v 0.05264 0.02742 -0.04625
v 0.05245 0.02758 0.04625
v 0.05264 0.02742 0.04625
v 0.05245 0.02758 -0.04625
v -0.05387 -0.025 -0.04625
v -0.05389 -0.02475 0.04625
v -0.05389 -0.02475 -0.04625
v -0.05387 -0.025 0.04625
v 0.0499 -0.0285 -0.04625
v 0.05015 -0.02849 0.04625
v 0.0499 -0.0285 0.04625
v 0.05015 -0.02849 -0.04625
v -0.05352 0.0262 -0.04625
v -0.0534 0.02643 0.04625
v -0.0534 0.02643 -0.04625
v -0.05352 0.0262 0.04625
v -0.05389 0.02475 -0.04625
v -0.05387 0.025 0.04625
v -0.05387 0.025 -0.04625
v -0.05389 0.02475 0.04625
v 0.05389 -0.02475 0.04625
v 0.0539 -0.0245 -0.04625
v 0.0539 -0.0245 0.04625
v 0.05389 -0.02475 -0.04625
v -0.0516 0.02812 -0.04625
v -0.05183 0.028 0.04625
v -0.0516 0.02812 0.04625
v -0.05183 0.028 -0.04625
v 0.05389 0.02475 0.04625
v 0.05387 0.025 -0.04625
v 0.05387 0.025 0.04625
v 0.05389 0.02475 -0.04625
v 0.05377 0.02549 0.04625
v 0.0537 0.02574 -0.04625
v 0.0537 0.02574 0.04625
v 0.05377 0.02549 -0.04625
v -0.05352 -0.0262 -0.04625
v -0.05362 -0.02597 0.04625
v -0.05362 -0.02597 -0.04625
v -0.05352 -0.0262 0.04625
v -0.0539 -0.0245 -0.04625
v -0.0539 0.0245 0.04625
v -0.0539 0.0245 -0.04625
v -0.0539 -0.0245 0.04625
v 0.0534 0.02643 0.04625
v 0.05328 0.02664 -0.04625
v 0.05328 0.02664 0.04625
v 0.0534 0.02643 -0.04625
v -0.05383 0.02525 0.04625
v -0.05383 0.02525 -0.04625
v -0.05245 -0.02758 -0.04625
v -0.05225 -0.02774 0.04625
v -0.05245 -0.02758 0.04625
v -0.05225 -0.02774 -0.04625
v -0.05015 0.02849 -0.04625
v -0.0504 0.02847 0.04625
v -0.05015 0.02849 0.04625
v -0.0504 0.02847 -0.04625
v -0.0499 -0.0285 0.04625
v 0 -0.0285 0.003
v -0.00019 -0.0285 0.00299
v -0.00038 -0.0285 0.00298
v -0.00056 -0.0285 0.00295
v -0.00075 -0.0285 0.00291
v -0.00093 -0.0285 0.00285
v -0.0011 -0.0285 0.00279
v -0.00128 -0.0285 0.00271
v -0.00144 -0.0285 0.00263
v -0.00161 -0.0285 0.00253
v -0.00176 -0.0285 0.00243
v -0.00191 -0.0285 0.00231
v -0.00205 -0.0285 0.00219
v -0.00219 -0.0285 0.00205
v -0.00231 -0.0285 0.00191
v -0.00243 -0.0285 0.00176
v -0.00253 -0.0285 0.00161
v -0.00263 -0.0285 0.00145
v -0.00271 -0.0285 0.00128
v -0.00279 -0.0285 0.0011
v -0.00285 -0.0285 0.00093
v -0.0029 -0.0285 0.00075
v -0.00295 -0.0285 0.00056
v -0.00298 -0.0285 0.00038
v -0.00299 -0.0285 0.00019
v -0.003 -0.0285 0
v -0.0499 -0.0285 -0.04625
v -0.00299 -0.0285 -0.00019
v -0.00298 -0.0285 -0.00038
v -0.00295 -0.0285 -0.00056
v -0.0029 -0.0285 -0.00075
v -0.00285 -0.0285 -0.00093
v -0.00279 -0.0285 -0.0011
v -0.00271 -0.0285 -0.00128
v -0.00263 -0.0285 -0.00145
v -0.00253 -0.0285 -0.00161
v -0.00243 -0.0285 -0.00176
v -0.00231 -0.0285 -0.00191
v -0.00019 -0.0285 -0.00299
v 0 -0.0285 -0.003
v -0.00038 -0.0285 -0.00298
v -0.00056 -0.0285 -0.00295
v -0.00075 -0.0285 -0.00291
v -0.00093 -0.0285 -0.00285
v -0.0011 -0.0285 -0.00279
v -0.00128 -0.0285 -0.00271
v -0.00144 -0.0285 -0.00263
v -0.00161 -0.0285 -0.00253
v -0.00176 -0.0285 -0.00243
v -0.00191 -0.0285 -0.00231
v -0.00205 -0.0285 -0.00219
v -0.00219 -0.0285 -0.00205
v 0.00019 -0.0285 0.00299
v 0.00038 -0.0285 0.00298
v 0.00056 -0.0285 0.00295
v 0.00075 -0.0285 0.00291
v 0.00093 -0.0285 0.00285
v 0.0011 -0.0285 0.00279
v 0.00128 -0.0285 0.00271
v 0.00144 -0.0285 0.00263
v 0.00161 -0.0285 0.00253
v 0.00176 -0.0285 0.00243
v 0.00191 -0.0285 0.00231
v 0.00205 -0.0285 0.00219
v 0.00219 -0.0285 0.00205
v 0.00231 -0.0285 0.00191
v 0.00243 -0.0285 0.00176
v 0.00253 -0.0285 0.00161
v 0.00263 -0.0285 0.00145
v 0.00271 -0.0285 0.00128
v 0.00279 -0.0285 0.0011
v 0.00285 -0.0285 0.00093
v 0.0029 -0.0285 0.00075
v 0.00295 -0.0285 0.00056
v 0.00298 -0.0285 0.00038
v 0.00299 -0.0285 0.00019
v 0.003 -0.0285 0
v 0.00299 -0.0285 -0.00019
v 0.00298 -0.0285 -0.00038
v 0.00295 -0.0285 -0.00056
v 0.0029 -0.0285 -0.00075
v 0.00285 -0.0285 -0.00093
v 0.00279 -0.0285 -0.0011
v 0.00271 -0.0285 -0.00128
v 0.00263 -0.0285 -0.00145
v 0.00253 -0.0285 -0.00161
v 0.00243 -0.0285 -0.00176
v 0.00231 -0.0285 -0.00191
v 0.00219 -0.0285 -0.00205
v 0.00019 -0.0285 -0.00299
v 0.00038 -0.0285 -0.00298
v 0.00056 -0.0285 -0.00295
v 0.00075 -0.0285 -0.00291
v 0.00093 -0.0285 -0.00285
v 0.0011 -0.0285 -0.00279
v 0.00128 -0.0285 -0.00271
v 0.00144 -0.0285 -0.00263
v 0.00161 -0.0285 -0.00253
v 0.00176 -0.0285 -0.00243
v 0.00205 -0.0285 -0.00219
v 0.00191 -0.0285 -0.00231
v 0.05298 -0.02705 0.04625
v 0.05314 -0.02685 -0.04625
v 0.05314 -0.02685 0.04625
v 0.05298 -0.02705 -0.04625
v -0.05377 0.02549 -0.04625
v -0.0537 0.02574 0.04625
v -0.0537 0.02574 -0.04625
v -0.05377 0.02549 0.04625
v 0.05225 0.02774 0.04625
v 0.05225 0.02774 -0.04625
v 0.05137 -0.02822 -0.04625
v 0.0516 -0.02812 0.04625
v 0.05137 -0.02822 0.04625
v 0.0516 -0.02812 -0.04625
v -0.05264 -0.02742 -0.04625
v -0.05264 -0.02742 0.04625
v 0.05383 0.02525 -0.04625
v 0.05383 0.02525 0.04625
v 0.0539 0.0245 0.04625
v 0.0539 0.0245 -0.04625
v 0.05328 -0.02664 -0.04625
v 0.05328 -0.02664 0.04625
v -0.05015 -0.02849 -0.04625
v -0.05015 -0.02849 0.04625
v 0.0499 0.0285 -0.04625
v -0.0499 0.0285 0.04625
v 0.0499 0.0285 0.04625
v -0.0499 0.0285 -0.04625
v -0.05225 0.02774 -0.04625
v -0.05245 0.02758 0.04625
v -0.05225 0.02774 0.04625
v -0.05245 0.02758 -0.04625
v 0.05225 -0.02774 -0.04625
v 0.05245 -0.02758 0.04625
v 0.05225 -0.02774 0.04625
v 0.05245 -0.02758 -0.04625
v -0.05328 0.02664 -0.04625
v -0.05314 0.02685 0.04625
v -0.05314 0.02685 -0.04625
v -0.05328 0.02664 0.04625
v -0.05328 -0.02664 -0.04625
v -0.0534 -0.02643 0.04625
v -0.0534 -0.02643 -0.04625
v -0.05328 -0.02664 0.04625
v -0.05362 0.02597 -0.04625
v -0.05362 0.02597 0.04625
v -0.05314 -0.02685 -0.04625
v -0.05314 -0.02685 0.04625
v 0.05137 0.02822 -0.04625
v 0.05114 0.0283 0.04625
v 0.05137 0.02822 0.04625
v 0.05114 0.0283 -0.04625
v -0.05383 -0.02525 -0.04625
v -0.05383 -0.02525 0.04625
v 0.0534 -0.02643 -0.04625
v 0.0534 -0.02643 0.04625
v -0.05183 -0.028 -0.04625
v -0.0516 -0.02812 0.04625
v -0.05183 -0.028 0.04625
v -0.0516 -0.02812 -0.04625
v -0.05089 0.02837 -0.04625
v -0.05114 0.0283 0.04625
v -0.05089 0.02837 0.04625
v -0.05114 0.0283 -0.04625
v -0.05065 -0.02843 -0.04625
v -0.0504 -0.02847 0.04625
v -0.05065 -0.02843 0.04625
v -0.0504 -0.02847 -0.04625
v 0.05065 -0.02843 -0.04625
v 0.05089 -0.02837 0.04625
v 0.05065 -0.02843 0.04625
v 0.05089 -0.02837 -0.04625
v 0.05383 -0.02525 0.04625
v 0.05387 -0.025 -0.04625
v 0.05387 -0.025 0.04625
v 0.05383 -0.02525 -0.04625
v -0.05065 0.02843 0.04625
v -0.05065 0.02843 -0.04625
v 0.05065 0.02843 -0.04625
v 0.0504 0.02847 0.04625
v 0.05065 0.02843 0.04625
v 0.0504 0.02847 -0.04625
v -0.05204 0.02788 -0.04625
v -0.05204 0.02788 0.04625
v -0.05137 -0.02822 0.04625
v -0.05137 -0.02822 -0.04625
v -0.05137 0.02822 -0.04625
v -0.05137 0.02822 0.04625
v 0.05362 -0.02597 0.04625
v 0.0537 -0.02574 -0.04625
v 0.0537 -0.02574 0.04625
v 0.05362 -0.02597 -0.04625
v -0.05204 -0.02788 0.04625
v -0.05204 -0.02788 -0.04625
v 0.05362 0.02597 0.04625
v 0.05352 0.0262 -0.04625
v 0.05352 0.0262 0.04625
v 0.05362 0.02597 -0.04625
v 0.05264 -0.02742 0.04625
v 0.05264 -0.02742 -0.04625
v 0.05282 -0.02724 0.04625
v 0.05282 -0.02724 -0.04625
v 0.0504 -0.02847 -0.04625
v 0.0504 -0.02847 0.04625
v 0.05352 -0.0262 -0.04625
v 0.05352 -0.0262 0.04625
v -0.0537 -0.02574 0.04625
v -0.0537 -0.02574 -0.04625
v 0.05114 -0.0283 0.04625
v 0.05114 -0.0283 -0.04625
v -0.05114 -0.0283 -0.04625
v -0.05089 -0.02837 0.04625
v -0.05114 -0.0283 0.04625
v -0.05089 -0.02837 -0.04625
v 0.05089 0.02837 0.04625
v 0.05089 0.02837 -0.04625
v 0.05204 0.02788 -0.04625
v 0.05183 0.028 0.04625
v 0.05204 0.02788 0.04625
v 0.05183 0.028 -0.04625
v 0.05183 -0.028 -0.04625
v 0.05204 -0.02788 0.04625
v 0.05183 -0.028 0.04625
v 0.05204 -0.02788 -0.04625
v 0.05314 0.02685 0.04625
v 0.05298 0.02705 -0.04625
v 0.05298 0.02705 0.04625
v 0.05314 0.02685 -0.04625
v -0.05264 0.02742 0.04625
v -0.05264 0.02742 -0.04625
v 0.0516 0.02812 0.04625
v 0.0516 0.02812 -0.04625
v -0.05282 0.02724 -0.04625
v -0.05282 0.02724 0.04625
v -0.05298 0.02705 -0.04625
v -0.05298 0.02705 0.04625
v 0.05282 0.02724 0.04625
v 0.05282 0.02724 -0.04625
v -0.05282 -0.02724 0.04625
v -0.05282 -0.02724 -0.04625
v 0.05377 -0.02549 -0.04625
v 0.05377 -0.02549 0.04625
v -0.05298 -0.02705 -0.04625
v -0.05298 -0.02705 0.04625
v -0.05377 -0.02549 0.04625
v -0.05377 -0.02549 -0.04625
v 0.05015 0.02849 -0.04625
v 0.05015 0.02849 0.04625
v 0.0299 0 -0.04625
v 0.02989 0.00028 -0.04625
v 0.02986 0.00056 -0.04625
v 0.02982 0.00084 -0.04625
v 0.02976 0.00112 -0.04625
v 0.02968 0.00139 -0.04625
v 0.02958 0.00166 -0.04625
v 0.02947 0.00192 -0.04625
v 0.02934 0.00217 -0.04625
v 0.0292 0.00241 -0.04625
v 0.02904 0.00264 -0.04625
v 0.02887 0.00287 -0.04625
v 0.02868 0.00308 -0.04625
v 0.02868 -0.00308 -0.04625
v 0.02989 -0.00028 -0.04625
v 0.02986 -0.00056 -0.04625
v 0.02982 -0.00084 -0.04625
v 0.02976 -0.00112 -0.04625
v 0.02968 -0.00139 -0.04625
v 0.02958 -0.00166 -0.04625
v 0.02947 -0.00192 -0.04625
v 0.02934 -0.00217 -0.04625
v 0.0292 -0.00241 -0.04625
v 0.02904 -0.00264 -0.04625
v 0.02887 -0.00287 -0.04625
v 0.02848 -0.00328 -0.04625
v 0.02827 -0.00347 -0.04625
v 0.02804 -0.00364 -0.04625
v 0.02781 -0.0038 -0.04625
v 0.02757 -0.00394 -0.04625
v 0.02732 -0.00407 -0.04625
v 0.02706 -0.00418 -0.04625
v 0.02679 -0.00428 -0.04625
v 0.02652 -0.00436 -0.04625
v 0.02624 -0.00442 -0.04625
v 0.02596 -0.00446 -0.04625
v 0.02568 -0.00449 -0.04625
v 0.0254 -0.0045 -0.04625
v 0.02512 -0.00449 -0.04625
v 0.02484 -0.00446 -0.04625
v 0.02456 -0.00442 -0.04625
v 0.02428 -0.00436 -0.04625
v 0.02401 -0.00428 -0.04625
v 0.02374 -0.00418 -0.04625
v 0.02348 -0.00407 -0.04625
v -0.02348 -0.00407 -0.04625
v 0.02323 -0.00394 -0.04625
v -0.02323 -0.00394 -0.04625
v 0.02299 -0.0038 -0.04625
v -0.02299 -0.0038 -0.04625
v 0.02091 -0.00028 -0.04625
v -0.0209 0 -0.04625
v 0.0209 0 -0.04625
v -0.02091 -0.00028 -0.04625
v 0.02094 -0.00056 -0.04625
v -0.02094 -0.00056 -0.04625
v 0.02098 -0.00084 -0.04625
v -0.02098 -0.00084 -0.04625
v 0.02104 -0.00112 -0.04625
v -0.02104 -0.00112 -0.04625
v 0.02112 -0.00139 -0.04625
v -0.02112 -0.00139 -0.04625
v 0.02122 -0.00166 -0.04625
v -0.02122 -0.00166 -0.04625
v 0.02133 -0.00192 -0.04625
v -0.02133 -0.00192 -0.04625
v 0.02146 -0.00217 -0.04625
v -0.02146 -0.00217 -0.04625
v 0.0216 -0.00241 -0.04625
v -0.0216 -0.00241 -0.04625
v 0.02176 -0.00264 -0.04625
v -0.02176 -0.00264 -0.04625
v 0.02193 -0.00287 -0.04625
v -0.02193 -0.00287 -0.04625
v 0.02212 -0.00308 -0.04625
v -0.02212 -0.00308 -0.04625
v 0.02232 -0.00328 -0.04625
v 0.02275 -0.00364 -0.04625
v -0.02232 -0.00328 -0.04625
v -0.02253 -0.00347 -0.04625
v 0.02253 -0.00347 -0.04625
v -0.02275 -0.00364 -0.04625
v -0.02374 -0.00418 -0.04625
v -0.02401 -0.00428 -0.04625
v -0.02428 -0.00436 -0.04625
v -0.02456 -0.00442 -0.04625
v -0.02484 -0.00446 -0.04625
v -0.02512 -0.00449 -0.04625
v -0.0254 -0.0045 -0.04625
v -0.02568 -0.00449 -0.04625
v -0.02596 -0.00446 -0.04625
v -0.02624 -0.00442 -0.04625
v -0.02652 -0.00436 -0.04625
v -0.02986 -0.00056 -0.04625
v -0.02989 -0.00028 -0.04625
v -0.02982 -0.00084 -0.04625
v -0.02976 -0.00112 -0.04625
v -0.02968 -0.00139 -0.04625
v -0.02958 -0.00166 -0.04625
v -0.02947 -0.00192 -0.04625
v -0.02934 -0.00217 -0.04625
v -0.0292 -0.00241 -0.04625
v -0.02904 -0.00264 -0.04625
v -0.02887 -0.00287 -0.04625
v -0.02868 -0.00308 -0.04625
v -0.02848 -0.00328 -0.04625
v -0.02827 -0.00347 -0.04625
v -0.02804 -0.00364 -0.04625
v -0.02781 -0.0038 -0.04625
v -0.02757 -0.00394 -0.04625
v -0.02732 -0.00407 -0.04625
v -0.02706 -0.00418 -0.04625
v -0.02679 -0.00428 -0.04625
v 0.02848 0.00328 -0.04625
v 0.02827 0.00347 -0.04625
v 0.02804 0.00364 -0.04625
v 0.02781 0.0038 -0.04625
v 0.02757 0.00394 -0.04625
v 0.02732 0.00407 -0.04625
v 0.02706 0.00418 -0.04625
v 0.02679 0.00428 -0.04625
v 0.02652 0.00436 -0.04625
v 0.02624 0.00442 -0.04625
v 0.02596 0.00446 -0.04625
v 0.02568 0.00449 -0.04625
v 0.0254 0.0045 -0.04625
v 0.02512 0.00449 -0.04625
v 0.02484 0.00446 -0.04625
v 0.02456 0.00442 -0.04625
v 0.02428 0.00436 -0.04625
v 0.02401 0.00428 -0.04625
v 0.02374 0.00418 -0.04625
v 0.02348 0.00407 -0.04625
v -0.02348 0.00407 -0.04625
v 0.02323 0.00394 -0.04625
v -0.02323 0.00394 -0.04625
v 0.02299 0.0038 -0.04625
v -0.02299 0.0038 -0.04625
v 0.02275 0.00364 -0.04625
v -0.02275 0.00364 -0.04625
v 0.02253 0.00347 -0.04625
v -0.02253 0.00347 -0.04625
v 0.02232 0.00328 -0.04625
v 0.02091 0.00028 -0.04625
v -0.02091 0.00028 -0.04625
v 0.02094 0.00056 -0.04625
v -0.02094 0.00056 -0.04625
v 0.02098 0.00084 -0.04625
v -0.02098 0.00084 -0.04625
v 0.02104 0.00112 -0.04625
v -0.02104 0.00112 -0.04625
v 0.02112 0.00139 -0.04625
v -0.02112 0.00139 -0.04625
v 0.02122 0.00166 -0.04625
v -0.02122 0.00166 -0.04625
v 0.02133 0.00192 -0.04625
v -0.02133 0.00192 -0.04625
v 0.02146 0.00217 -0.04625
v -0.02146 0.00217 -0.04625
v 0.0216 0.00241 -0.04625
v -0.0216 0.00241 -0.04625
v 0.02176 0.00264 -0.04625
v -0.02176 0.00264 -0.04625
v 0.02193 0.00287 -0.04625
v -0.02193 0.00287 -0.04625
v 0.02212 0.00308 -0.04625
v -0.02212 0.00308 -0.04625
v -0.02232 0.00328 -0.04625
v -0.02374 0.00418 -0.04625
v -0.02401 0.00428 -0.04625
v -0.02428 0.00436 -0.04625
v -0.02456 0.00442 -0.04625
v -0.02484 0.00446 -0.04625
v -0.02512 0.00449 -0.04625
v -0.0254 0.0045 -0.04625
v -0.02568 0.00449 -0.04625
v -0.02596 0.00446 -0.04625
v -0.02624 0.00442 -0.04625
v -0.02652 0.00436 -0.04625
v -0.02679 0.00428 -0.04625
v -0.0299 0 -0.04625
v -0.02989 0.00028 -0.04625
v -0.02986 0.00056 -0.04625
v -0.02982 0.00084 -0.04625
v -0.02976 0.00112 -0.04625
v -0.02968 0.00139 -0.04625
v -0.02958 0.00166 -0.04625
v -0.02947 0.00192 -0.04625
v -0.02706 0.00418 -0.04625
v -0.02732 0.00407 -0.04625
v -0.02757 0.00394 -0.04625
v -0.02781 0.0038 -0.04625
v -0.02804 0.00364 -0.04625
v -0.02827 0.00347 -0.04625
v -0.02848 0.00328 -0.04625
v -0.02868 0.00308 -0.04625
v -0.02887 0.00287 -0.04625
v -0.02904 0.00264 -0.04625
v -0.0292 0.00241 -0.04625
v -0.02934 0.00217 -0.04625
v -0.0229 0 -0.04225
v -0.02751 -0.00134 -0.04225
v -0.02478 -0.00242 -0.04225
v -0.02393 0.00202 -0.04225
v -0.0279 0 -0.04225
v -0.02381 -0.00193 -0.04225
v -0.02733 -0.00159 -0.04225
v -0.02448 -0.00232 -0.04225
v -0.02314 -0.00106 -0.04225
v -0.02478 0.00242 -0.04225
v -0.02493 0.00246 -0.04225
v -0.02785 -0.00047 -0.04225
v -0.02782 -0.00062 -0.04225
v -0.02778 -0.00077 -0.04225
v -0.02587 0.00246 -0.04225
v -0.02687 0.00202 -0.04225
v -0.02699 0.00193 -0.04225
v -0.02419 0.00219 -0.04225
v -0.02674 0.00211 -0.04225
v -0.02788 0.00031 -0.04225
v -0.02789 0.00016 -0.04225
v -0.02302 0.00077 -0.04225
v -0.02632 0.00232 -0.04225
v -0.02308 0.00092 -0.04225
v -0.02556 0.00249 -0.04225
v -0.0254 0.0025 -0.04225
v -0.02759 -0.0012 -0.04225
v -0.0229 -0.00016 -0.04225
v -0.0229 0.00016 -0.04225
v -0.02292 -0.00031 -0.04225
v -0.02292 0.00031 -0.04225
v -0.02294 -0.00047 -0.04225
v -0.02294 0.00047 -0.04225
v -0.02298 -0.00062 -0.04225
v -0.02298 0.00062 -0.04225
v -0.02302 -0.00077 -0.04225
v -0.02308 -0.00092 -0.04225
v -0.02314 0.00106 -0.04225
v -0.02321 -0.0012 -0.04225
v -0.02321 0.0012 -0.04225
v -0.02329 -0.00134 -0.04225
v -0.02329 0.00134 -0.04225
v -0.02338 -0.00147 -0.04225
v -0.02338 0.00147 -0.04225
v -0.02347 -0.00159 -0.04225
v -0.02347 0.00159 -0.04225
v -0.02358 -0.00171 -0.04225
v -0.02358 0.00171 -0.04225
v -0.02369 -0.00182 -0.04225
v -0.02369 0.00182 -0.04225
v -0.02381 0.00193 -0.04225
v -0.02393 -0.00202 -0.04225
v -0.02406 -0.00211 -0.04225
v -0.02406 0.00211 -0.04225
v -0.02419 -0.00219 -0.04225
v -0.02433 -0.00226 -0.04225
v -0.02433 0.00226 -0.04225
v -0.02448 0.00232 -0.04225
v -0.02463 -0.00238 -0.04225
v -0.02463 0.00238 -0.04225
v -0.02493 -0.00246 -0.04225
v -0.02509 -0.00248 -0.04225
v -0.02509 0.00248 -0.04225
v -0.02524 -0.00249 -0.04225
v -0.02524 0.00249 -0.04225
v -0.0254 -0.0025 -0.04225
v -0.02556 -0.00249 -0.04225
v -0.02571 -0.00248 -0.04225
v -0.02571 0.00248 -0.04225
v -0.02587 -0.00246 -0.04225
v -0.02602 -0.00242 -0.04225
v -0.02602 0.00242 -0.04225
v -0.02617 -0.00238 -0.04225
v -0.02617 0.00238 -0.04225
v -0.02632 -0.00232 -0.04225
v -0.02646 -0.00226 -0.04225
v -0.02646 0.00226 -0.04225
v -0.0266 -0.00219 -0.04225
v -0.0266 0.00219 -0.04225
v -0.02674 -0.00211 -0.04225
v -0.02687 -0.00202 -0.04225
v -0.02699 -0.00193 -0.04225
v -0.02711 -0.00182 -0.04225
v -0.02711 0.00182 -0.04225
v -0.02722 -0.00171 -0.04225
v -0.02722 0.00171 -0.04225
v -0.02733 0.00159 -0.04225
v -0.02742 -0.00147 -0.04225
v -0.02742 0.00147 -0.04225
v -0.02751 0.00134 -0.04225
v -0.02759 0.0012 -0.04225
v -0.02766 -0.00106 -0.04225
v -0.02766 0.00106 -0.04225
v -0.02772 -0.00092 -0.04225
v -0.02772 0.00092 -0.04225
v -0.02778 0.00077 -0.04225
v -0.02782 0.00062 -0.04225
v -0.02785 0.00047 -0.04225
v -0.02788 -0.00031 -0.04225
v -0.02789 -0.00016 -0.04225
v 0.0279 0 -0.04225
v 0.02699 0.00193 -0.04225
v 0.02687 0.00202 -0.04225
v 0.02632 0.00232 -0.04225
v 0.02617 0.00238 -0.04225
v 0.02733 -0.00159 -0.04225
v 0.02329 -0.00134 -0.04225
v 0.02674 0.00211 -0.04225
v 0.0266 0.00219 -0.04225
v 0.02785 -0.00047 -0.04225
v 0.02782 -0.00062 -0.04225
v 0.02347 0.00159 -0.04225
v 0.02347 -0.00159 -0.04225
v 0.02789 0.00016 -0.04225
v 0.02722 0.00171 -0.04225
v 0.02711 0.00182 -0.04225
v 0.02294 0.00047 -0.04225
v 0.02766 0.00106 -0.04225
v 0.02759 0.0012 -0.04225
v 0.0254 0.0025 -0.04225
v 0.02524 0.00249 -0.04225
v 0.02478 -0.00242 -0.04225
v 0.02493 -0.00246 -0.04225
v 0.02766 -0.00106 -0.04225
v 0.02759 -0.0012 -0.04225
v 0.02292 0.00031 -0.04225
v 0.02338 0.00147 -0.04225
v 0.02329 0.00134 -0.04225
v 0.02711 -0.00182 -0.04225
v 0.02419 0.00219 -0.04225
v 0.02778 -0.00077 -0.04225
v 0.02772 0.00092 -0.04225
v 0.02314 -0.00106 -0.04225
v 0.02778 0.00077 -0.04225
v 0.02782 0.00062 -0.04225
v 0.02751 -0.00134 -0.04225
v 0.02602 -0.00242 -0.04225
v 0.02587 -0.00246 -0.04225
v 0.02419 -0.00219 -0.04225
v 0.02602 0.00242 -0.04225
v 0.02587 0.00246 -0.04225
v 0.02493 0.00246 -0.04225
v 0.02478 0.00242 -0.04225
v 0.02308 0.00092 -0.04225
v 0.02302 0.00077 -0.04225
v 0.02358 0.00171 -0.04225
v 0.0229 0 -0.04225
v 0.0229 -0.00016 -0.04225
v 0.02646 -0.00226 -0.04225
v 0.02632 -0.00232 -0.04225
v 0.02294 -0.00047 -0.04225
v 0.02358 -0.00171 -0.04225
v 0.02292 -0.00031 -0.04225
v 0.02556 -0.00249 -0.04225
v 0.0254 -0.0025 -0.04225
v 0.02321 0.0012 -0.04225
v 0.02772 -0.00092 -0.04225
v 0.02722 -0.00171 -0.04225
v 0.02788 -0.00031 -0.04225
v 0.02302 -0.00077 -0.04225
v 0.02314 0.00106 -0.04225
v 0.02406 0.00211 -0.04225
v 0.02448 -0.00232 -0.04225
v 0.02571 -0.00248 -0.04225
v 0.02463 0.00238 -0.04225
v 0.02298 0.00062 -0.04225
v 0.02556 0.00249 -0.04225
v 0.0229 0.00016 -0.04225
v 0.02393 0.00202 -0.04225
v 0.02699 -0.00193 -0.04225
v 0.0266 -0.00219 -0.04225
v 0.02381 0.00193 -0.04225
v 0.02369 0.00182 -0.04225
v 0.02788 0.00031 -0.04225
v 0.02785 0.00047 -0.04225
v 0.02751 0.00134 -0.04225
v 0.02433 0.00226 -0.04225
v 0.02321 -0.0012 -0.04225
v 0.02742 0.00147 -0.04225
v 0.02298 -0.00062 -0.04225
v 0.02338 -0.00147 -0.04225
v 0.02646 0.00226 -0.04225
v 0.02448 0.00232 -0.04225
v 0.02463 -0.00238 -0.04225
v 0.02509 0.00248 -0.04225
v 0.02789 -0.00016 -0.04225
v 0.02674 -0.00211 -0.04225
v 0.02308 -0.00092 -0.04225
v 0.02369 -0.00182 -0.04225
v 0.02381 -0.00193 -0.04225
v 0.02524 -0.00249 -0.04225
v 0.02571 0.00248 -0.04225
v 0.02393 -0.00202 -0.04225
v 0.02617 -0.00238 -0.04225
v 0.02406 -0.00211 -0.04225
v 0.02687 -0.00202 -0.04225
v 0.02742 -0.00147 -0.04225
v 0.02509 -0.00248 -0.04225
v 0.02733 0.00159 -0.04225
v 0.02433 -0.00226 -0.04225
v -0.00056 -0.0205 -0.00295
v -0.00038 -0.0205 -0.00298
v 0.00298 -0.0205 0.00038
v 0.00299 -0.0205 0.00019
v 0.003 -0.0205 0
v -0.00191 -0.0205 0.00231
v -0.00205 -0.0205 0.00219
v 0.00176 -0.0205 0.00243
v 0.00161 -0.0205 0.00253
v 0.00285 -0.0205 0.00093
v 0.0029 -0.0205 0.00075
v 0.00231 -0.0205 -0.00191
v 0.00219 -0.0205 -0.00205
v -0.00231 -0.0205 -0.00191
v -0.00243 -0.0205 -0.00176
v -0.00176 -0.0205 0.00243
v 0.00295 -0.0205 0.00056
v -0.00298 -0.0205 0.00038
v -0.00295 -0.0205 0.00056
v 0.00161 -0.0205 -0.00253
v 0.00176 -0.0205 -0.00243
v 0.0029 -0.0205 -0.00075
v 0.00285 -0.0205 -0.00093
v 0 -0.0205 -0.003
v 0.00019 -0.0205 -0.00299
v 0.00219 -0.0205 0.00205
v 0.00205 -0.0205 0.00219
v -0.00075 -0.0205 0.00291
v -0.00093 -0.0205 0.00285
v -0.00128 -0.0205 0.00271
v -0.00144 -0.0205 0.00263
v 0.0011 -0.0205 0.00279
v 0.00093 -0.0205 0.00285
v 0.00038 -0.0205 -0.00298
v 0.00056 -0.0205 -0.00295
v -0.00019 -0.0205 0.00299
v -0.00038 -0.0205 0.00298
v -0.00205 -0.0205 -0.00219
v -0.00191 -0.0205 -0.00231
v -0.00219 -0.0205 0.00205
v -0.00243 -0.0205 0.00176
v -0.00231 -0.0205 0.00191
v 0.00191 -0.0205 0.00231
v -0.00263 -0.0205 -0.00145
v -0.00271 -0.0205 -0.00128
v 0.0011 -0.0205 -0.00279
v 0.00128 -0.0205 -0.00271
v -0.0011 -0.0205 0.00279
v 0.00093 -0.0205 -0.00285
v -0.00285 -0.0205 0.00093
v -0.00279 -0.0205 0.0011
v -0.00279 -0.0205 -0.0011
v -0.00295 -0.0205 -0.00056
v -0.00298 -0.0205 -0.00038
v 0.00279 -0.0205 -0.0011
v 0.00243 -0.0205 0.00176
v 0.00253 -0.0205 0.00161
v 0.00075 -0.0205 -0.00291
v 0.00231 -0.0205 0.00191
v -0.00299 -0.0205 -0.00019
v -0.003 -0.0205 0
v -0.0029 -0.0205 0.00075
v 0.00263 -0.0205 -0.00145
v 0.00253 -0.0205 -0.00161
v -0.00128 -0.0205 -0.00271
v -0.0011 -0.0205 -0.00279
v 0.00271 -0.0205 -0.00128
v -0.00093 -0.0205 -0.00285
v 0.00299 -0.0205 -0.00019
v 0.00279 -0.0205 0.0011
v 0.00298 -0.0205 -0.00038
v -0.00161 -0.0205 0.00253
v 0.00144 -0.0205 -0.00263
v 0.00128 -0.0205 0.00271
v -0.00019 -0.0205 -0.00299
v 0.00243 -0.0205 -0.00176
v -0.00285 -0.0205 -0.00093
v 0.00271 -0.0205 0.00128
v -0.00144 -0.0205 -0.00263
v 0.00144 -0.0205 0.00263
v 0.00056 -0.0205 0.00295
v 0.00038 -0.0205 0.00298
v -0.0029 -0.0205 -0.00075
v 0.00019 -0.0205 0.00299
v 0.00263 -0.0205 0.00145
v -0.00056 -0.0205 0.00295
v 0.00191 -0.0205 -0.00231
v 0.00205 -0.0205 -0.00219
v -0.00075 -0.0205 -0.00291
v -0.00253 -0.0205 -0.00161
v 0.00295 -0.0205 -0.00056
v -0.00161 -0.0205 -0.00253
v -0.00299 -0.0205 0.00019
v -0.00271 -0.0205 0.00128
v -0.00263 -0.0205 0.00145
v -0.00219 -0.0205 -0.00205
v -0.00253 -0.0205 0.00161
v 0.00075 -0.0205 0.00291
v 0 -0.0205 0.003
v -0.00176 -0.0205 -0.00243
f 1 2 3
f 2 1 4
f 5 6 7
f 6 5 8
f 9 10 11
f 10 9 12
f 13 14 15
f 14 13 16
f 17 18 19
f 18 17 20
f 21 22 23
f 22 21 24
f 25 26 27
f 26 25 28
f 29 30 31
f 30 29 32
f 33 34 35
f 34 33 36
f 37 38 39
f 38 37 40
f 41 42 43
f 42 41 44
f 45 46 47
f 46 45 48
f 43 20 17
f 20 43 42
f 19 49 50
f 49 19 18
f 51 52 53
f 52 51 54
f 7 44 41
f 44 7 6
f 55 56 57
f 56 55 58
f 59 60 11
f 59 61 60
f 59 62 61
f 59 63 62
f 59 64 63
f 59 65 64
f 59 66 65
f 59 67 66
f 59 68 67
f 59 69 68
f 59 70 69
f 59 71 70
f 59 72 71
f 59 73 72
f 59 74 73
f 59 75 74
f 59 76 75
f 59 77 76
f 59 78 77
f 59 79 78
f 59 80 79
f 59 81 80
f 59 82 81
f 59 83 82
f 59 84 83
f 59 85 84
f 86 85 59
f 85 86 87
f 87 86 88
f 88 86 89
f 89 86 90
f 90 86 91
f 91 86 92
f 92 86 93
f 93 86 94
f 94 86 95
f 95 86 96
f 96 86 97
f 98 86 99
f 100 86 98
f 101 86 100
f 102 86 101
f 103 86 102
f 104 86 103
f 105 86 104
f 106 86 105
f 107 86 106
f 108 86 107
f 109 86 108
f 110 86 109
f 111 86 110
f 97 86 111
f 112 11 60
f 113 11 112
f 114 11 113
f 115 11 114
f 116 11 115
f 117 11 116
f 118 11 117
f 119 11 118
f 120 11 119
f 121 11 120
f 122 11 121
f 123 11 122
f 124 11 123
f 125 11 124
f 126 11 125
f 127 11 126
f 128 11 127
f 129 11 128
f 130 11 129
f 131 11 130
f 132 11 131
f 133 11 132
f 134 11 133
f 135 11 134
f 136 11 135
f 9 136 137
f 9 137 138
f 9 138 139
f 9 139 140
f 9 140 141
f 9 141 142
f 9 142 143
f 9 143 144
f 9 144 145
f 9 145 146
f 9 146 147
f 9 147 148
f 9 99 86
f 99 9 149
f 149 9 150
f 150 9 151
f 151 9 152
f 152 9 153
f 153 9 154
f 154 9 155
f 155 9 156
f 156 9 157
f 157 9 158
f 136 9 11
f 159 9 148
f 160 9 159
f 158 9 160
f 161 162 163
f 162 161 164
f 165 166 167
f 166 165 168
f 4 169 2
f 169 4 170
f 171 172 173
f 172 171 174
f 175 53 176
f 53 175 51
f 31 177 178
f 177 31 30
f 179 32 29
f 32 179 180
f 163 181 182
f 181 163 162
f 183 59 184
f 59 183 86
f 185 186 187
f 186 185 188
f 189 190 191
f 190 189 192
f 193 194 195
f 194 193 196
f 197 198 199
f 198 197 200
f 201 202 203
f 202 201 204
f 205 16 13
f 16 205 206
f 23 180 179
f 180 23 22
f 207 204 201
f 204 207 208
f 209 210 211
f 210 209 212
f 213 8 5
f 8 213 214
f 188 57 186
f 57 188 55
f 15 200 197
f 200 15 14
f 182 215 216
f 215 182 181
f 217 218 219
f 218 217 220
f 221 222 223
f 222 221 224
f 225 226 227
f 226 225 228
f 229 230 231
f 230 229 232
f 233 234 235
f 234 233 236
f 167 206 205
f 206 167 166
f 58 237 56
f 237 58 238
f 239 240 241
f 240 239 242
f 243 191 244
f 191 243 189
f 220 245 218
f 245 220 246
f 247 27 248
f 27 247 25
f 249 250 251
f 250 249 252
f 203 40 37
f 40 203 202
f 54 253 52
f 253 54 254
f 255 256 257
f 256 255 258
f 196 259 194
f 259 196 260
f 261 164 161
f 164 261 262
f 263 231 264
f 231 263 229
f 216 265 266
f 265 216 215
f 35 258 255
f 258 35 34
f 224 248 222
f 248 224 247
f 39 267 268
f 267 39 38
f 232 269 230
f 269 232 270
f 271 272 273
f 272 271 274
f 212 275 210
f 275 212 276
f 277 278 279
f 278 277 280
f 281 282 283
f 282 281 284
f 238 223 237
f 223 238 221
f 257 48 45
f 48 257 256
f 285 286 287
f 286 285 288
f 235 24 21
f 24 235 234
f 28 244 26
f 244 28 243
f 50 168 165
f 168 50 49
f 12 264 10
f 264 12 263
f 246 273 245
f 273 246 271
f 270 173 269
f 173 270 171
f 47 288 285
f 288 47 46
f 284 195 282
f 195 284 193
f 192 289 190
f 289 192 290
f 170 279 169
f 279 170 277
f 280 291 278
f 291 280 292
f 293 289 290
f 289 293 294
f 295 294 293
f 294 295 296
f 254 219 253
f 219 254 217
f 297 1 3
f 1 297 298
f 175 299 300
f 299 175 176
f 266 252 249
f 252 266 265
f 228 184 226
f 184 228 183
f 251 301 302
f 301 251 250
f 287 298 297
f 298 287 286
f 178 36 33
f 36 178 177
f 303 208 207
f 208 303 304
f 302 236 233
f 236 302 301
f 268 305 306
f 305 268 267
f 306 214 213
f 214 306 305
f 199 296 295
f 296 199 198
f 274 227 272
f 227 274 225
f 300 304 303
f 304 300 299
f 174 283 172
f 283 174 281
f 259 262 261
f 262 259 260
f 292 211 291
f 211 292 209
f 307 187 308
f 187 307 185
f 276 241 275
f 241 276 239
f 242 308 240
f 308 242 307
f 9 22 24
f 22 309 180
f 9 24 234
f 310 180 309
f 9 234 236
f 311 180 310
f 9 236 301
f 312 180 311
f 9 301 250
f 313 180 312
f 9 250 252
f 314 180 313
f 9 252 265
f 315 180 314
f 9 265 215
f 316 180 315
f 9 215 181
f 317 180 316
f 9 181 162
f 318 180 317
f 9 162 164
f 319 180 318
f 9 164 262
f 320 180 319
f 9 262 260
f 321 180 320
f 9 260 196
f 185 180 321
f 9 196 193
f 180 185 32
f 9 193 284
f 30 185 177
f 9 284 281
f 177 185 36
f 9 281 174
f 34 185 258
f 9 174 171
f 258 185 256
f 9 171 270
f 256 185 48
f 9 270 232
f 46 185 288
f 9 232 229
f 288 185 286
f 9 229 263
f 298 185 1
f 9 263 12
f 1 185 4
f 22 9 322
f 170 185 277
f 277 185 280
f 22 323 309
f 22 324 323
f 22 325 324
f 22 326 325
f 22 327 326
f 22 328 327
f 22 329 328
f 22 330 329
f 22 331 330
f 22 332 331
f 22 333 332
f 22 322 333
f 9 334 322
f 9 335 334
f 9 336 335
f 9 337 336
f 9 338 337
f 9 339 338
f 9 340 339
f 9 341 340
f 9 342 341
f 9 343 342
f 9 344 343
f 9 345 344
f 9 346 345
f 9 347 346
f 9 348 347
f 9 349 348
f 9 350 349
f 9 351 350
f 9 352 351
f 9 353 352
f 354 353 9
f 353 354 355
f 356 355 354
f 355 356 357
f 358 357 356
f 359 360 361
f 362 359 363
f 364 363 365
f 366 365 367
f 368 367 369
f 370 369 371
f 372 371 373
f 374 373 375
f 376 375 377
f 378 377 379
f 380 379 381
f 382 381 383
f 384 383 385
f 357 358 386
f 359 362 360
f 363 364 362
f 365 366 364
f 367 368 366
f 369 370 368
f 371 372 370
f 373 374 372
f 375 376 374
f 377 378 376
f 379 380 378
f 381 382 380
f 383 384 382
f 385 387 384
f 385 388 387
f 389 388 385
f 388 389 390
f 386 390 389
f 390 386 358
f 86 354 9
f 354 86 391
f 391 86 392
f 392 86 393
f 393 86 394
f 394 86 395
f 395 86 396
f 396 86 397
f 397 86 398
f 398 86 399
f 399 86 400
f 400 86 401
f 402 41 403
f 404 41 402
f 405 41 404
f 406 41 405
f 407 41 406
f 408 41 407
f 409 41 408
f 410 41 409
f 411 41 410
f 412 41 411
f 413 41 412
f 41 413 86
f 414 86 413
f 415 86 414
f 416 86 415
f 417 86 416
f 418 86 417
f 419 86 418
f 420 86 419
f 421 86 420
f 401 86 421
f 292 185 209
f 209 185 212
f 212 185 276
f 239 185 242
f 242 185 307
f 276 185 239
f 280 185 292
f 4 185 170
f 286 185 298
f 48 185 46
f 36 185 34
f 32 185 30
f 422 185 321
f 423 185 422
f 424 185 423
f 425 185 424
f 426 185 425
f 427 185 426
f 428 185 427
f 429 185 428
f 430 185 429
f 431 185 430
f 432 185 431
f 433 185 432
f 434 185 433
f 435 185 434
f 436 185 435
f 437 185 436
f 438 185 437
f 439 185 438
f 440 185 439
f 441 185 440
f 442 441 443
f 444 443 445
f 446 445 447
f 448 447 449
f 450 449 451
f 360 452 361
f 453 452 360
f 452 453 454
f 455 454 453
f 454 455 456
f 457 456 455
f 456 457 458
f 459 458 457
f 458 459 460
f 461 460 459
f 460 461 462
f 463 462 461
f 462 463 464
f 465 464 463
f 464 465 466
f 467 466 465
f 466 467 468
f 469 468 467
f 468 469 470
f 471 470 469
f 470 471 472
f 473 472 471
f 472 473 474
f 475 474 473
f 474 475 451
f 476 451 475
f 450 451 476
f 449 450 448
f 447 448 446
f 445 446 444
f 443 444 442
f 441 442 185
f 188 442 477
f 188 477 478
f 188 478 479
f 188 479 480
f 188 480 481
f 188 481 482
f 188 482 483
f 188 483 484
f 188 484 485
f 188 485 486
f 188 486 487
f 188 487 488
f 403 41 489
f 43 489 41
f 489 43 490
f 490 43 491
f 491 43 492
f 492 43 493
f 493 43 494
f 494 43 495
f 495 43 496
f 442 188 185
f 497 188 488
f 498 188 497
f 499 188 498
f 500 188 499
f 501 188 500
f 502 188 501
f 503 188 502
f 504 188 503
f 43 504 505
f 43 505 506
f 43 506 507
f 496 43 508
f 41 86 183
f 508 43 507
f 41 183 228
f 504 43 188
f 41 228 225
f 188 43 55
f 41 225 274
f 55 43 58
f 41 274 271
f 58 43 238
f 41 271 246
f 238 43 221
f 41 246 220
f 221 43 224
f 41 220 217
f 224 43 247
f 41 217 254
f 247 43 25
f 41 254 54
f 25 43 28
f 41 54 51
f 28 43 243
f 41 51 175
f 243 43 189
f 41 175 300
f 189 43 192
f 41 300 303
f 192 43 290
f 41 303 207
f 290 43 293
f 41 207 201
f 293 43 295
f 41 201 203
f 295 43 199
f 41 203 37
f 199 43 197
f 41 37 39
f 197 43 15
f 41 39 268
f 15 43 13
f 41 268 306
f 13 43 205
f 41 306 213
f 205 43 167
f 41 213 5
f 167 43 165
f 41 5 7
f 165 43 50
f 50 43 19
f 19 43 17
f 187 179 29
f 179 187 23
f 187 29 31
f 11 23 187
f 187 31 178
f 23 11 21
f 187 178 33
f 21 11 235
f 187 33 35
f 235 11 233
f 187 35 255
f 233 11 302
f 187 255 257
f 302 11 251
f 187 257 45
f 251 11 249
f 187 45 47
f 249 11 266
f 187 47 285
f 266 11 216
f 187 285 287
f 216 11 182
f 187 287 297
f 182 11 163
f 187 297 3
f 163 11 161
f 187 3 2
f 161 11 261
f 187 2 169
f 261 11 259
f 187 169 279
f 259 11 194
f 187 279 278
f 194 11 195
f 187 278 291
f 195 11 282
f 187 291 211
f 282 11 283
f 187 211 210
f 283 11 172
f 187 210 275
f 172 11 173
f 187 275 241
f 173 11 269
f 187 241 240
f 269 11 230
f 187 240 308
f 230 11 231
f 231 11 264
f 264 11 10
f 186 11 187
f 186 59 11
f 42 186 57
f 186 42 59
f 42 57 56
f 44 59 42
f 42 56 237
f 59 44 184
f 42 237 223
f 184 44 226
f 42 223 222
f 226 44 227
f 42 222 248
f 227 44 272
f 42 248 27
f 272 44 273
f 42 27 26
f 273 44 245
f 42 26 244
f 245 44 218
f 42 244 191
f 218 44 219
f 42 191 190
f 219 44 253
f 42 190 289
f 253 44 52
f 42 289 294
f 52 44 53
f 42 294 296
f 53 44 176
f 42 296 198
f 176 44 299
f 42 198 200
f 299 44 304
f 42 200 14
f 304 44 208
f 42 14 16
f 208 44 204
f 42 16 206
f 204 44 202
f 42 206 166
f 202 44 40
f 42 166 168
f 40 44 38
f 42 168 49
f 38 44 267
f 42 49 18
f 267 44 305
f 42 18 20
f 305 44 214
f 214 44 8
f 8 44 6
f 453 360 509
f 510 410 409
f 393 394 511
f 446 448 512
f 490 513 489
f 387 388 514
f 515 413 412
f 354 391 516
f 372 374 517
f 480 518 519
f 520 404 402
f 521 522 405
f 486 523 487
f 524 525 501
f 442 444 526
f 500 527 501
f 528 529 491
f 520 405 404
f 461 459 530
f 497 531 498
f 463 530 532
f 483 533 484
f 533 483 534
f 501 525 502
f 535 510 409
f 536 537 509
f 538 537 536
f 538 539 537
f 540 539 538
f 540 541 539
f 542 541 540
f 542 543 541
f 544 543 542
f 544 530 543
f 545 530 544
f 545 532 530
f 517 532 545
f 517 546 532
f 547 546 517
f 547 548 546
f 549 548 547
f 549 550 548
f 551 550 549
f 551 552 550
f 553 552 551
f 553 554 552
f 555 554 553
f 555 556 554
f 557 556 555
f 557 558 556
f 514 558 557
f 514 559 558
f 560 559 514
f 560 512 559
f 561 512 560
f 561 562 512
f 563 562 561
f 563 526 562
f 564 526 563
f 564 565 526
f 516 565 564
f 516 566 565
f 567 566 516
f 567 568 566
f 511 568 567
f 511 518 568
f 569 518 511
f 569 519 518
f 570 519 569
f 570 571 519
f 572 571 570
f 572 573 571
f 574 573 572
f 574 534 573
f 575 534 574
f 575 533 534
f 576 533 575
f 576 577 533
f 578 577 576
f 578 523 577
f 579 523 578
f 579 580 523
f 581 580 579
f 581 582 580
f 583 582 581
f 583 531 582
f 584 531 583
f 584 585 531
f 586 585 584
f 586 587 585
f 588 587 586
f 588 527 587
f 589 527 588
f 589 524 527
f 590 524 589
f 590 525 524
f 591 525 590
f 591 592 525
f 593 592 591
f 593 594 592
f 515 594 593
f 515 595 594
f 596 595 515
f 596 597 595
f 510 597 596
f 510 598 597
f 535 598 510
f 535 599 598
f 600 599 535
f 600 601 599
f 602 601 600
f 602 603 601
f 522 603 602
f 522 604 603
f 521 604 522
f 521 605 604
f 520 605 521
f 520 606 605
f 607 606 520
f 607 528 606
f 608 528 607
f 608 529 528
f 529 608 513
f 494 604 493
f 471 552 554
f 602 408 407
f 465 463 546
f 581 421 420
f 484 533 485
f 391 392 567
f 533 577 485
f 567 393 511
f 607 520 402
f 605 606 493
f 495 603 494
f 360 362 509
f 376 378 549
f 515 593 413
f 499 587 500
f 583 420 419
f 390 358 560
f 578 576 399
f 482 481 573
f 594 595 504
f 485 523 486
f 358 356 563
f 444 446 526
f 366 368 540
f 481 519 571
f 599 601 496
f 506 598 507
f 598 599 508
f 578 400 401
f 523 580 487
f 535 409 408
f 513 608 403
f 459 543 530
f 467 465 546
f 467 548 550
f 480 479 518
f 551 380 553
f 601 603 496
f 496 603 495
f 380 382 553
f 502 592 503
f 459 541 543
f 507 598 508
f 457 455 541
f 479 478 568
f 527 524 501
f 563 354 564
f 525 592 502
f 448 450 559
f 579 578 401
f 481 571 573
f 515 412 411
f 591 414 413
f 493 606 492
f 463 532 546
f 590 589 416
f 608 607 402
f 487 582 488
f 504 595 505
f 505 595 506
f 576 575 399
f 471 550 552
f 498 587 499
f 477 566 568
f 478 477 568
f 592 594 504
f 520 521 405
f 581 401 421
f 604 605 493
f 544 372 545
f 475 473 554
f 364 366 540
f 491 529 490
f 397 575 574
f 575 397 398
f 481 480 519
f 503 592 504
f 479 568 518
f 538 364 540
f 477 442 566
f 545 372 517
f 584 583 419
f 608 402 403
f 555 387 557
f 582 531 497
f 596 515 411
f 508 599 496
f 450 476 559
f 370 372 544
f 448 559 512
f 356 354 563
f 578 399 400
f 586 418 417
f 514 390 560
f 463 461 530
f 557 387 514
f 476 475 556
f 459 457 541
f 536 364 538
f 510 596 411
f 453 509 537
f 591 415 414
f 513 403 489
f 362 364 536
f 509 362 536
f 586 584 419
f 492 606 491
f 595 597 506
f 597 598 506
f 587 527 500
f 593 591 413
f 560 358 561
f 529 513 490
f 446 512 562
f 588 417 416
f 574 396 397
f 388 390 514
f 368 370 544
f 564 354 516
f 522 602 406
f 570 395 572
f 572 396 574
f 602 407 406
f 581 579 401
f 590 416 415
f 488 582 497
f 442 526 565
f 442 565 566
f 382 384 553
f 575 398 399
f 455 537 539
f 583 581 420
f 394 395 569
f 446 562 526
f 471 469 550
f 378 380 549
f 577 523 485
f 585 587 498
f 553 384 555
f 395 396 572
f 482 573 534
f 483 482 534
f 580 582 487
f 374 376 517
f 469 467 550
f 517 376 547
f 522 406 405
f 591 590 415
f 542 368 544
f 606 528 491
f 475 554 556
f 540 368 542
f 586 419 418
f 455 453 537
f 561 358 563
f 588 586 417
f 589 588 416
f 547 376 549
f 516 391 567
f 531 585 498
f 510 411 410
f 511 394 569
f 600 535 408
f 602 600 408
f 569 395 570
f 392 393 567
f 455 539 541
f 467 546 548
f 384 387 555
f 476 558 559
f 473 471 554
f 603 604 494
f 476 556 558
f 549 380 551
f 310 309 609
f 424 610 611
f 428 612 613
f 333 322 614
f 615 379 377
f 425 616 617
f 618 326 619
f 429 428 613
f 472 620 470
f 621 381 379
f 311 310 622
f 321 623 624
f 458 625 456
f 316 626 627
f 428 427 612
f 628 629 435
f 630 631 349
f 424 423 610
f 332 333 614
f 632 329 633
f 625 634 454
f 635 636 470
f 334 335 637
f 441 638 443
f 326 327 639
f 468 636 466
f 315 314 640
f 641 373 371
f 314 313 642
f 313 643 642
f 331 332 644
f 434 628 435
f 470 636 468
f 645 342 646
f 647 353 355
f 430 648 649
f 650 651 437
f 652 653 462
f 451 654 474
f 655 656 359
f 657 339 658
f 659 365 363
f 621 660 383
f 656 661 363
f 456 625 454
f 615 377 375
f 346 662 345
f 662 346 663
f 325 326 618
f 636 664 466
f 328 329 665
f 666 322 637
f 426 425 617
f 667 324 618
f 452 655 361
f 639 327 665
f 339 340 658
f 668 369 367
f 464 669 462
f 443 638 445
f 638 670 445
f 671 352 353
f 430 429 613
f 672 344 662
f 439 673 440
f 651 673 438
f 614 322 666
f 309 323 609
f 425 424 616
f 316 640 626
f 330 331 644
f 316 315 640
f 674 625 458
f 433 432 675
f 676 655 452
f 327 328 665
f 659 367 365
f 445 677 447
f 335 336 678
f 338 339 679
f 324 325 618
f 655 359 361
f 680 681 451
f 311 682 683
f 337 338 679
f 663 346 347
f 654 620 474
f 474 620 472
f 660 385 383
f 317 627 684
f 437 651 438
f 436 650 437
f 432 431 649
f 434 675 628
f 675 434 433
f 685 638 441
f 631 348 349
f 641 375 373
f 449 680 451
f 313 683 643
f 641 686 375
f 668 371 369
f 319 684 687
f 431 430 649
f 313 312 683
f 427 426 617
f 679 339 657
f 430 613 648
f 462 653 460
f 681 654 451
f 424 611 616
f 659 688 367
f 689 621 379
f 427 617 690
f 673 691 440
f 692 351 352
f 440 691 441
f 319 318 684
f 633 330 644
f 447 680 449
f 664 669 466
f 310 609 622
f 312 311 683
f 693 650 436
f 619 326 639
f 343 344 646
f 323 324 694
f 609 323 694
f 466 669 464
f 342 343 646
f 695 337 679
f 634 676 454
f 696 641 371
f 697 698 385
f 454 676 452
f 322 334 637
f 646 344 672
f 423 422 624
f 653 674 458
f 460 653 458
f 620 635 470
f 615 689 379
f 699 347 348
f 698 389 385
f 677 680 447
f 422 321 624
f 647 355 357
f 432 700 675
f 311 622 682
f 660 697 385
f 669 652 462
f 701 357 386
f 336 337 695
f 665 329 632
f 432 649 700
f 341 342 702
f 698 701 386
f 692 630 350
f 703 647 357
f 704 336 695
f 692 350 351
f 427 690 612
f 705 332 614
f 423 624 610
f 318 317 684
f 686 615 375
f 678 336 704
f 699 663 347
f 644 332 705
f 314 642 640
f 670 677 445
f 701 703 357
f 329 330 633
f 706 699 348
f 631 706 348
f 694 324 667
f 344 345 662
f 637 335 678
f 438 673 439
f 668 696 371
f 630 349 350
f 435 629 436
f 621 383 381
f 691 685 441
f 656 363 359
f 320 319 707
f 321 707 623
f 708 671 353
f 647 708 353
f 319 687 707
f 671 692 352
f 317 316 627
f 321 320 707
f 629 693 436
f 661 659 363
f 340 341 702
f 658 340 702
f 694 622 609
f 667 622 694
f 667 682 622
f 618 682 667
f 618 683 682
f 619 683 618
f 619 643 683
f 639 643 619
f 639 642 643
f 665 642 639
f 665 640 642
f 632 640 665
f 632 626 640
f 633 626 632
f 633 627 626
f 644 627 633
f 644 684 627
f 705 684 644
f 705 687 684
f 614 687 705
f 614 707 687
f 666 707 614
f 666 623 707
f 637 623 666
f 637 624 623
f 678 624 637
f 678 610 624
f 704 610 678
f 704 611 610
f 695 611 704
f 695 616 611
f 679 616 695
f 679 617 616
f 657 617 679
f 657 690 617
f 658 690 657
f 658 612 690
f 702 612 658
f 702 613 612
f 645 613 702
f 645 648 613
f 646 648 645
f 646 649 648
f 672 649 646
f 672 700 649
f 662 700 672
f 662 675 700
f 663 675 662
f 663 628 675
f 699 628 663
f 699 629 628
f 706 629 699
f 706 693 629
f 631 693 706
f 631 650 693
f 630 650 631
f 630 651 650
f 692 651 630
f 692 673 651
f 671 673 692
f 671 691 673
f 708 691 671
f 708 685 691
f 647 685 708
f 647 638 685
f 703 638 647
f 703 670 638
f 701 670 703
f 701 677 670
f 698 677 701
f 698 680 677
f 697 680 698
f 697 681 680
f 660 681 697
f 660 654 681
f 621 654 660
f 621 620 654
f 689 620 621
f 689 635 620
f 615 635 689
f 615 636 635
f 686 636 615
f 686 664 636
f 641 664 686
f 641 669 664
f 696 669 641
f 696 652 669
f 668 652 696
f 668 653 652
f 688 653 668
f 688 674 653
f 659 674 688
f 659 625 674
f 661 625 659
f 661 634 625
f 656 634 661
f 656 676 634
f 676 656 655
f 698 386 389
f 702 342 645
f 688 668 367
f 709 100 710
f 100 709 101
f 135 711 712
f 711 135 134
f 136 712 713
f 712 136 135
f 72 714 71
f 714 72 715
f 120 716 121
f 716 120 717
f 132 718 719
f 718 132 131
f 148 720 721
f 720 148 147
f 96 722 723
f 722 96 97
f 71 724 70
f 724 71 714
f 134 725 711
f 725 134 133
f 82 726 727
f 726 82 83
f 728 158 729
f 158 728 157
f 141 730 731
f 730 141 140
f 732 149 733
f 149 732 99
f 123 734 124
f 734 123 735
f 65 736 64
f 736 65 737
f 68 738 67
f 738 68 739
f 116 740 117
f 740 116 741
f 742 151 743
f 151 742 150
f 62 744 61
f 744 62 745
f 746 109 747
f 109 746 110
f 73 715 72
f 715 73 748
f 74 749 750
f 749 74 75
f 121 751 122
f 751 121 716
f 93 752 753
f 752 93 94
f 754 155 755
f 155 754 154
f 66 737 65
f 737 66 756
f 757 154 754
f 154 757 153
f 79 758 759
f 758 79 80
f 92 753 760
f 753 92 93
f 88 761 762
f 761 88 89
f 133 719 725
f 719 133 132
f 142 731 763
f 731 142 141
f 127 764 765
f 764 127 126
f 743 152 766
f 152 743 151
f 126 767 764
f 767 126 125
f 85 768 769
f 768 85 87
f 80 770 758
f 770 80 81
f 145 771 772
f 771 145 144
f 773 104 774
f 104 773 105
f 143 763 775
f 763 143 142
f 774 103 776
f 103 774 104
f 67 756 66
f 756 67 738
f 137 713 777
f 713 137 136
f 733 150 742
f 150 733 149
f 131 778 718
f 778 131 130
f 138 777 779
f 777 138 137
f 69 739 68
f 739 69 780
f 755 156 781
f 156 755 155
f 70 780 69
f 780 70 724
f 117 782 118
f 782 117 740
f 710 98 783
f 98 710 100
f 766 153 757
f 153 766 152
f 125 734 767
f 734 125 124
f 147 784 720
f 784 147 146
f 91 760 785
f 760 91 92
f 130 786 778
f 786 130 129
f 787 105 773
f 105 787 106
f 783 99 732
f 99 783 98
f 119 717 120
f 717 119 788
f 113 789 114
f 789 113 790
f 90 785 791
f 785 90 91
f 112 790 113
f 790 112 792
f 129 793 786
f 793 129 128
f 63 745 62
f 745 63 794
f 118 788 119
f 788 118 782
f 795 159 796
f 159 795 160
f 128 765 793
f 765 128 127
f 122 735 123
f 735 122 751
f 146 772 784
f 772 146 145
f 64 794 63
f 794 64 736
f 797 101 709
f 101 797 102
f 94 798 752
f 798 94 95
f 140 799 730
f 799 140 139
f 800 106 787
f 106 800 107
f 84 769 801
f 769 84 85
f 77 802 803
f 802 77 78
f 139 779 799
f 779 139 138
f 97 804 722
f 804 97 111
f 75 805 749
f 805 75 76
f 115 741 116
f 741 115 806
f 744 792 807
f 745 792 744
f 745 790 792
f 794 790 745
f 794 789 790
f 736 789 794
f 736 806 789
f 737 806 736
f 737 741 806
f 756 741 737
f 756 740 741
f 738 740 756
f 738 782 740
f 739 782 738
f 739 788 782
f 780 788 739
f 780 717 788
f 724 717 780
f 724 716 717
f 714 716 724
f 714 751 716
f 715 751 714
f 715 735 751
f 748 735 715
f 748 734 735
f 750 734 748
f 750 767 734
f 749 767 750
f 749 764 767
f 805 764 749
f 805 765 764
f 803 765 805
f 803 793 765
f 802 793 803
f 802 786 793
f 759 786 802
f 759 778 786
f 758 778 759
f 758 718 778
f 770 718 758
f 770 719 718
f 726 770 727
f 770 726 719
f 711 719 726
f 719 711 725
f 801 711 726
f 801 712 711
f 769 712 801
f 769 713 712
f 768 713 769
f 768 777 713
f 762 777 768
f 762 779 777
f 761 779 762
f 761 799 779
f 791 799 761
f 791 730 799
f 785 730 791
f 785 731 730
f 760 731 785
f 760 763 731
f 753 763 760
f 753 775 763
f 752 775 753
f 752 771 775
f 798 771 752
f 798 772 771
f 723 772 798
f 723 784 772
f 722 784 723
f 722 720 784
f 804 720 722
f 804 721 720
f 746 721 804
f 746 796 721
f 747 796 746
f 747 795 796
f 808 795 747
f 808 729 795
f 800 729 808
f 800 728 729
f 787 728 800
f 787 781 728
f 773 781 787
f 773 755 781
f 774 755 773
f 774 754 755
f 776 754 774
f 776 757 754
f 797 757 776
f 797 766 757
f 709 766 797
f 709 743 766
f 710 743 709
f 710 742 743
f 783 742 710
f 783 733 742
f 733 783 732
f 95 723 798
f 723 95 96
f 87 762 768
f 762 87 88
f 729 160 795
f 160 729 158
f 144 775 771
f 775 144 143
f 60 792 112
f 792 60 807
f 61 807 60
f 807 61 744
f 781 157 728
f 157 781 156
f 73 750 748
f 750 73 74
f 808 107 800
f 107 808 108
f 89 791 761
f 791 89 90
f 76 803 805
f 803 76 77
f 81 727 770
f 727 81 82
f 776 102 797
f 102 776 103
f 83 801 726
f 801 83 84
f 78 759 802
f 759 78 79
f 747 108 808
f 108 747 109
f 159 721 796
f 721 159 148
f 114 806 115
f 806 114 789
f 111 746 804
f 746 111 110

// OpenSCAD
// PhaseSpace camera dimensions
cam_w=0.1078;
cam_h=0.0570;
cam_d=0.0925;
cam_r=0.004;
cam_w2=cam_w/2;
cam_w2r=cam_w2-cam_r;
cam_h2=cam_h/2;
cam_h2r=cam_h2-cam_r;
cam_d2=cam_d/2;
lens_d=0.004;
mount_d=0.008;

translate([0,0,-cam_d2])
difference()
{
    // Camera body
    linear_extrude(cam_d)
    {
        hull()
        {
            translate([cam_w2r,cam_h2r,0]) { circle(cam_r,$fn=100); }
            translate([-cam_w2r,cam_h2r,0]) { circle(cam_r,$fn=100); }
            translate([-cam_w2r,-cam_h2r,0]) { circle(cam_r,$fn=100); }
            translate([cam_w2r,-cam_h2r,0]) { circle(cam_r,$fn=100); }
        }
    }

    // Lens openings
    translate([-(cam_w2-cam_h2),0,lens_d/2])
    cylinder(lens_d,0.0045,0.0025,$fn=100,true);
    
    translate([(cam_w2-cam_h2),0,lens_d/2])
    cylinder(lens_d,0.0045,0.0025,$fn=100,true);

    // Mount hole
    translate([0,-cam_h2+mount_d/2,cam_d2])
    rotate([90,0,0])
    cylinder(mount_d,0.003,0.003,$fn=100,true);
}
